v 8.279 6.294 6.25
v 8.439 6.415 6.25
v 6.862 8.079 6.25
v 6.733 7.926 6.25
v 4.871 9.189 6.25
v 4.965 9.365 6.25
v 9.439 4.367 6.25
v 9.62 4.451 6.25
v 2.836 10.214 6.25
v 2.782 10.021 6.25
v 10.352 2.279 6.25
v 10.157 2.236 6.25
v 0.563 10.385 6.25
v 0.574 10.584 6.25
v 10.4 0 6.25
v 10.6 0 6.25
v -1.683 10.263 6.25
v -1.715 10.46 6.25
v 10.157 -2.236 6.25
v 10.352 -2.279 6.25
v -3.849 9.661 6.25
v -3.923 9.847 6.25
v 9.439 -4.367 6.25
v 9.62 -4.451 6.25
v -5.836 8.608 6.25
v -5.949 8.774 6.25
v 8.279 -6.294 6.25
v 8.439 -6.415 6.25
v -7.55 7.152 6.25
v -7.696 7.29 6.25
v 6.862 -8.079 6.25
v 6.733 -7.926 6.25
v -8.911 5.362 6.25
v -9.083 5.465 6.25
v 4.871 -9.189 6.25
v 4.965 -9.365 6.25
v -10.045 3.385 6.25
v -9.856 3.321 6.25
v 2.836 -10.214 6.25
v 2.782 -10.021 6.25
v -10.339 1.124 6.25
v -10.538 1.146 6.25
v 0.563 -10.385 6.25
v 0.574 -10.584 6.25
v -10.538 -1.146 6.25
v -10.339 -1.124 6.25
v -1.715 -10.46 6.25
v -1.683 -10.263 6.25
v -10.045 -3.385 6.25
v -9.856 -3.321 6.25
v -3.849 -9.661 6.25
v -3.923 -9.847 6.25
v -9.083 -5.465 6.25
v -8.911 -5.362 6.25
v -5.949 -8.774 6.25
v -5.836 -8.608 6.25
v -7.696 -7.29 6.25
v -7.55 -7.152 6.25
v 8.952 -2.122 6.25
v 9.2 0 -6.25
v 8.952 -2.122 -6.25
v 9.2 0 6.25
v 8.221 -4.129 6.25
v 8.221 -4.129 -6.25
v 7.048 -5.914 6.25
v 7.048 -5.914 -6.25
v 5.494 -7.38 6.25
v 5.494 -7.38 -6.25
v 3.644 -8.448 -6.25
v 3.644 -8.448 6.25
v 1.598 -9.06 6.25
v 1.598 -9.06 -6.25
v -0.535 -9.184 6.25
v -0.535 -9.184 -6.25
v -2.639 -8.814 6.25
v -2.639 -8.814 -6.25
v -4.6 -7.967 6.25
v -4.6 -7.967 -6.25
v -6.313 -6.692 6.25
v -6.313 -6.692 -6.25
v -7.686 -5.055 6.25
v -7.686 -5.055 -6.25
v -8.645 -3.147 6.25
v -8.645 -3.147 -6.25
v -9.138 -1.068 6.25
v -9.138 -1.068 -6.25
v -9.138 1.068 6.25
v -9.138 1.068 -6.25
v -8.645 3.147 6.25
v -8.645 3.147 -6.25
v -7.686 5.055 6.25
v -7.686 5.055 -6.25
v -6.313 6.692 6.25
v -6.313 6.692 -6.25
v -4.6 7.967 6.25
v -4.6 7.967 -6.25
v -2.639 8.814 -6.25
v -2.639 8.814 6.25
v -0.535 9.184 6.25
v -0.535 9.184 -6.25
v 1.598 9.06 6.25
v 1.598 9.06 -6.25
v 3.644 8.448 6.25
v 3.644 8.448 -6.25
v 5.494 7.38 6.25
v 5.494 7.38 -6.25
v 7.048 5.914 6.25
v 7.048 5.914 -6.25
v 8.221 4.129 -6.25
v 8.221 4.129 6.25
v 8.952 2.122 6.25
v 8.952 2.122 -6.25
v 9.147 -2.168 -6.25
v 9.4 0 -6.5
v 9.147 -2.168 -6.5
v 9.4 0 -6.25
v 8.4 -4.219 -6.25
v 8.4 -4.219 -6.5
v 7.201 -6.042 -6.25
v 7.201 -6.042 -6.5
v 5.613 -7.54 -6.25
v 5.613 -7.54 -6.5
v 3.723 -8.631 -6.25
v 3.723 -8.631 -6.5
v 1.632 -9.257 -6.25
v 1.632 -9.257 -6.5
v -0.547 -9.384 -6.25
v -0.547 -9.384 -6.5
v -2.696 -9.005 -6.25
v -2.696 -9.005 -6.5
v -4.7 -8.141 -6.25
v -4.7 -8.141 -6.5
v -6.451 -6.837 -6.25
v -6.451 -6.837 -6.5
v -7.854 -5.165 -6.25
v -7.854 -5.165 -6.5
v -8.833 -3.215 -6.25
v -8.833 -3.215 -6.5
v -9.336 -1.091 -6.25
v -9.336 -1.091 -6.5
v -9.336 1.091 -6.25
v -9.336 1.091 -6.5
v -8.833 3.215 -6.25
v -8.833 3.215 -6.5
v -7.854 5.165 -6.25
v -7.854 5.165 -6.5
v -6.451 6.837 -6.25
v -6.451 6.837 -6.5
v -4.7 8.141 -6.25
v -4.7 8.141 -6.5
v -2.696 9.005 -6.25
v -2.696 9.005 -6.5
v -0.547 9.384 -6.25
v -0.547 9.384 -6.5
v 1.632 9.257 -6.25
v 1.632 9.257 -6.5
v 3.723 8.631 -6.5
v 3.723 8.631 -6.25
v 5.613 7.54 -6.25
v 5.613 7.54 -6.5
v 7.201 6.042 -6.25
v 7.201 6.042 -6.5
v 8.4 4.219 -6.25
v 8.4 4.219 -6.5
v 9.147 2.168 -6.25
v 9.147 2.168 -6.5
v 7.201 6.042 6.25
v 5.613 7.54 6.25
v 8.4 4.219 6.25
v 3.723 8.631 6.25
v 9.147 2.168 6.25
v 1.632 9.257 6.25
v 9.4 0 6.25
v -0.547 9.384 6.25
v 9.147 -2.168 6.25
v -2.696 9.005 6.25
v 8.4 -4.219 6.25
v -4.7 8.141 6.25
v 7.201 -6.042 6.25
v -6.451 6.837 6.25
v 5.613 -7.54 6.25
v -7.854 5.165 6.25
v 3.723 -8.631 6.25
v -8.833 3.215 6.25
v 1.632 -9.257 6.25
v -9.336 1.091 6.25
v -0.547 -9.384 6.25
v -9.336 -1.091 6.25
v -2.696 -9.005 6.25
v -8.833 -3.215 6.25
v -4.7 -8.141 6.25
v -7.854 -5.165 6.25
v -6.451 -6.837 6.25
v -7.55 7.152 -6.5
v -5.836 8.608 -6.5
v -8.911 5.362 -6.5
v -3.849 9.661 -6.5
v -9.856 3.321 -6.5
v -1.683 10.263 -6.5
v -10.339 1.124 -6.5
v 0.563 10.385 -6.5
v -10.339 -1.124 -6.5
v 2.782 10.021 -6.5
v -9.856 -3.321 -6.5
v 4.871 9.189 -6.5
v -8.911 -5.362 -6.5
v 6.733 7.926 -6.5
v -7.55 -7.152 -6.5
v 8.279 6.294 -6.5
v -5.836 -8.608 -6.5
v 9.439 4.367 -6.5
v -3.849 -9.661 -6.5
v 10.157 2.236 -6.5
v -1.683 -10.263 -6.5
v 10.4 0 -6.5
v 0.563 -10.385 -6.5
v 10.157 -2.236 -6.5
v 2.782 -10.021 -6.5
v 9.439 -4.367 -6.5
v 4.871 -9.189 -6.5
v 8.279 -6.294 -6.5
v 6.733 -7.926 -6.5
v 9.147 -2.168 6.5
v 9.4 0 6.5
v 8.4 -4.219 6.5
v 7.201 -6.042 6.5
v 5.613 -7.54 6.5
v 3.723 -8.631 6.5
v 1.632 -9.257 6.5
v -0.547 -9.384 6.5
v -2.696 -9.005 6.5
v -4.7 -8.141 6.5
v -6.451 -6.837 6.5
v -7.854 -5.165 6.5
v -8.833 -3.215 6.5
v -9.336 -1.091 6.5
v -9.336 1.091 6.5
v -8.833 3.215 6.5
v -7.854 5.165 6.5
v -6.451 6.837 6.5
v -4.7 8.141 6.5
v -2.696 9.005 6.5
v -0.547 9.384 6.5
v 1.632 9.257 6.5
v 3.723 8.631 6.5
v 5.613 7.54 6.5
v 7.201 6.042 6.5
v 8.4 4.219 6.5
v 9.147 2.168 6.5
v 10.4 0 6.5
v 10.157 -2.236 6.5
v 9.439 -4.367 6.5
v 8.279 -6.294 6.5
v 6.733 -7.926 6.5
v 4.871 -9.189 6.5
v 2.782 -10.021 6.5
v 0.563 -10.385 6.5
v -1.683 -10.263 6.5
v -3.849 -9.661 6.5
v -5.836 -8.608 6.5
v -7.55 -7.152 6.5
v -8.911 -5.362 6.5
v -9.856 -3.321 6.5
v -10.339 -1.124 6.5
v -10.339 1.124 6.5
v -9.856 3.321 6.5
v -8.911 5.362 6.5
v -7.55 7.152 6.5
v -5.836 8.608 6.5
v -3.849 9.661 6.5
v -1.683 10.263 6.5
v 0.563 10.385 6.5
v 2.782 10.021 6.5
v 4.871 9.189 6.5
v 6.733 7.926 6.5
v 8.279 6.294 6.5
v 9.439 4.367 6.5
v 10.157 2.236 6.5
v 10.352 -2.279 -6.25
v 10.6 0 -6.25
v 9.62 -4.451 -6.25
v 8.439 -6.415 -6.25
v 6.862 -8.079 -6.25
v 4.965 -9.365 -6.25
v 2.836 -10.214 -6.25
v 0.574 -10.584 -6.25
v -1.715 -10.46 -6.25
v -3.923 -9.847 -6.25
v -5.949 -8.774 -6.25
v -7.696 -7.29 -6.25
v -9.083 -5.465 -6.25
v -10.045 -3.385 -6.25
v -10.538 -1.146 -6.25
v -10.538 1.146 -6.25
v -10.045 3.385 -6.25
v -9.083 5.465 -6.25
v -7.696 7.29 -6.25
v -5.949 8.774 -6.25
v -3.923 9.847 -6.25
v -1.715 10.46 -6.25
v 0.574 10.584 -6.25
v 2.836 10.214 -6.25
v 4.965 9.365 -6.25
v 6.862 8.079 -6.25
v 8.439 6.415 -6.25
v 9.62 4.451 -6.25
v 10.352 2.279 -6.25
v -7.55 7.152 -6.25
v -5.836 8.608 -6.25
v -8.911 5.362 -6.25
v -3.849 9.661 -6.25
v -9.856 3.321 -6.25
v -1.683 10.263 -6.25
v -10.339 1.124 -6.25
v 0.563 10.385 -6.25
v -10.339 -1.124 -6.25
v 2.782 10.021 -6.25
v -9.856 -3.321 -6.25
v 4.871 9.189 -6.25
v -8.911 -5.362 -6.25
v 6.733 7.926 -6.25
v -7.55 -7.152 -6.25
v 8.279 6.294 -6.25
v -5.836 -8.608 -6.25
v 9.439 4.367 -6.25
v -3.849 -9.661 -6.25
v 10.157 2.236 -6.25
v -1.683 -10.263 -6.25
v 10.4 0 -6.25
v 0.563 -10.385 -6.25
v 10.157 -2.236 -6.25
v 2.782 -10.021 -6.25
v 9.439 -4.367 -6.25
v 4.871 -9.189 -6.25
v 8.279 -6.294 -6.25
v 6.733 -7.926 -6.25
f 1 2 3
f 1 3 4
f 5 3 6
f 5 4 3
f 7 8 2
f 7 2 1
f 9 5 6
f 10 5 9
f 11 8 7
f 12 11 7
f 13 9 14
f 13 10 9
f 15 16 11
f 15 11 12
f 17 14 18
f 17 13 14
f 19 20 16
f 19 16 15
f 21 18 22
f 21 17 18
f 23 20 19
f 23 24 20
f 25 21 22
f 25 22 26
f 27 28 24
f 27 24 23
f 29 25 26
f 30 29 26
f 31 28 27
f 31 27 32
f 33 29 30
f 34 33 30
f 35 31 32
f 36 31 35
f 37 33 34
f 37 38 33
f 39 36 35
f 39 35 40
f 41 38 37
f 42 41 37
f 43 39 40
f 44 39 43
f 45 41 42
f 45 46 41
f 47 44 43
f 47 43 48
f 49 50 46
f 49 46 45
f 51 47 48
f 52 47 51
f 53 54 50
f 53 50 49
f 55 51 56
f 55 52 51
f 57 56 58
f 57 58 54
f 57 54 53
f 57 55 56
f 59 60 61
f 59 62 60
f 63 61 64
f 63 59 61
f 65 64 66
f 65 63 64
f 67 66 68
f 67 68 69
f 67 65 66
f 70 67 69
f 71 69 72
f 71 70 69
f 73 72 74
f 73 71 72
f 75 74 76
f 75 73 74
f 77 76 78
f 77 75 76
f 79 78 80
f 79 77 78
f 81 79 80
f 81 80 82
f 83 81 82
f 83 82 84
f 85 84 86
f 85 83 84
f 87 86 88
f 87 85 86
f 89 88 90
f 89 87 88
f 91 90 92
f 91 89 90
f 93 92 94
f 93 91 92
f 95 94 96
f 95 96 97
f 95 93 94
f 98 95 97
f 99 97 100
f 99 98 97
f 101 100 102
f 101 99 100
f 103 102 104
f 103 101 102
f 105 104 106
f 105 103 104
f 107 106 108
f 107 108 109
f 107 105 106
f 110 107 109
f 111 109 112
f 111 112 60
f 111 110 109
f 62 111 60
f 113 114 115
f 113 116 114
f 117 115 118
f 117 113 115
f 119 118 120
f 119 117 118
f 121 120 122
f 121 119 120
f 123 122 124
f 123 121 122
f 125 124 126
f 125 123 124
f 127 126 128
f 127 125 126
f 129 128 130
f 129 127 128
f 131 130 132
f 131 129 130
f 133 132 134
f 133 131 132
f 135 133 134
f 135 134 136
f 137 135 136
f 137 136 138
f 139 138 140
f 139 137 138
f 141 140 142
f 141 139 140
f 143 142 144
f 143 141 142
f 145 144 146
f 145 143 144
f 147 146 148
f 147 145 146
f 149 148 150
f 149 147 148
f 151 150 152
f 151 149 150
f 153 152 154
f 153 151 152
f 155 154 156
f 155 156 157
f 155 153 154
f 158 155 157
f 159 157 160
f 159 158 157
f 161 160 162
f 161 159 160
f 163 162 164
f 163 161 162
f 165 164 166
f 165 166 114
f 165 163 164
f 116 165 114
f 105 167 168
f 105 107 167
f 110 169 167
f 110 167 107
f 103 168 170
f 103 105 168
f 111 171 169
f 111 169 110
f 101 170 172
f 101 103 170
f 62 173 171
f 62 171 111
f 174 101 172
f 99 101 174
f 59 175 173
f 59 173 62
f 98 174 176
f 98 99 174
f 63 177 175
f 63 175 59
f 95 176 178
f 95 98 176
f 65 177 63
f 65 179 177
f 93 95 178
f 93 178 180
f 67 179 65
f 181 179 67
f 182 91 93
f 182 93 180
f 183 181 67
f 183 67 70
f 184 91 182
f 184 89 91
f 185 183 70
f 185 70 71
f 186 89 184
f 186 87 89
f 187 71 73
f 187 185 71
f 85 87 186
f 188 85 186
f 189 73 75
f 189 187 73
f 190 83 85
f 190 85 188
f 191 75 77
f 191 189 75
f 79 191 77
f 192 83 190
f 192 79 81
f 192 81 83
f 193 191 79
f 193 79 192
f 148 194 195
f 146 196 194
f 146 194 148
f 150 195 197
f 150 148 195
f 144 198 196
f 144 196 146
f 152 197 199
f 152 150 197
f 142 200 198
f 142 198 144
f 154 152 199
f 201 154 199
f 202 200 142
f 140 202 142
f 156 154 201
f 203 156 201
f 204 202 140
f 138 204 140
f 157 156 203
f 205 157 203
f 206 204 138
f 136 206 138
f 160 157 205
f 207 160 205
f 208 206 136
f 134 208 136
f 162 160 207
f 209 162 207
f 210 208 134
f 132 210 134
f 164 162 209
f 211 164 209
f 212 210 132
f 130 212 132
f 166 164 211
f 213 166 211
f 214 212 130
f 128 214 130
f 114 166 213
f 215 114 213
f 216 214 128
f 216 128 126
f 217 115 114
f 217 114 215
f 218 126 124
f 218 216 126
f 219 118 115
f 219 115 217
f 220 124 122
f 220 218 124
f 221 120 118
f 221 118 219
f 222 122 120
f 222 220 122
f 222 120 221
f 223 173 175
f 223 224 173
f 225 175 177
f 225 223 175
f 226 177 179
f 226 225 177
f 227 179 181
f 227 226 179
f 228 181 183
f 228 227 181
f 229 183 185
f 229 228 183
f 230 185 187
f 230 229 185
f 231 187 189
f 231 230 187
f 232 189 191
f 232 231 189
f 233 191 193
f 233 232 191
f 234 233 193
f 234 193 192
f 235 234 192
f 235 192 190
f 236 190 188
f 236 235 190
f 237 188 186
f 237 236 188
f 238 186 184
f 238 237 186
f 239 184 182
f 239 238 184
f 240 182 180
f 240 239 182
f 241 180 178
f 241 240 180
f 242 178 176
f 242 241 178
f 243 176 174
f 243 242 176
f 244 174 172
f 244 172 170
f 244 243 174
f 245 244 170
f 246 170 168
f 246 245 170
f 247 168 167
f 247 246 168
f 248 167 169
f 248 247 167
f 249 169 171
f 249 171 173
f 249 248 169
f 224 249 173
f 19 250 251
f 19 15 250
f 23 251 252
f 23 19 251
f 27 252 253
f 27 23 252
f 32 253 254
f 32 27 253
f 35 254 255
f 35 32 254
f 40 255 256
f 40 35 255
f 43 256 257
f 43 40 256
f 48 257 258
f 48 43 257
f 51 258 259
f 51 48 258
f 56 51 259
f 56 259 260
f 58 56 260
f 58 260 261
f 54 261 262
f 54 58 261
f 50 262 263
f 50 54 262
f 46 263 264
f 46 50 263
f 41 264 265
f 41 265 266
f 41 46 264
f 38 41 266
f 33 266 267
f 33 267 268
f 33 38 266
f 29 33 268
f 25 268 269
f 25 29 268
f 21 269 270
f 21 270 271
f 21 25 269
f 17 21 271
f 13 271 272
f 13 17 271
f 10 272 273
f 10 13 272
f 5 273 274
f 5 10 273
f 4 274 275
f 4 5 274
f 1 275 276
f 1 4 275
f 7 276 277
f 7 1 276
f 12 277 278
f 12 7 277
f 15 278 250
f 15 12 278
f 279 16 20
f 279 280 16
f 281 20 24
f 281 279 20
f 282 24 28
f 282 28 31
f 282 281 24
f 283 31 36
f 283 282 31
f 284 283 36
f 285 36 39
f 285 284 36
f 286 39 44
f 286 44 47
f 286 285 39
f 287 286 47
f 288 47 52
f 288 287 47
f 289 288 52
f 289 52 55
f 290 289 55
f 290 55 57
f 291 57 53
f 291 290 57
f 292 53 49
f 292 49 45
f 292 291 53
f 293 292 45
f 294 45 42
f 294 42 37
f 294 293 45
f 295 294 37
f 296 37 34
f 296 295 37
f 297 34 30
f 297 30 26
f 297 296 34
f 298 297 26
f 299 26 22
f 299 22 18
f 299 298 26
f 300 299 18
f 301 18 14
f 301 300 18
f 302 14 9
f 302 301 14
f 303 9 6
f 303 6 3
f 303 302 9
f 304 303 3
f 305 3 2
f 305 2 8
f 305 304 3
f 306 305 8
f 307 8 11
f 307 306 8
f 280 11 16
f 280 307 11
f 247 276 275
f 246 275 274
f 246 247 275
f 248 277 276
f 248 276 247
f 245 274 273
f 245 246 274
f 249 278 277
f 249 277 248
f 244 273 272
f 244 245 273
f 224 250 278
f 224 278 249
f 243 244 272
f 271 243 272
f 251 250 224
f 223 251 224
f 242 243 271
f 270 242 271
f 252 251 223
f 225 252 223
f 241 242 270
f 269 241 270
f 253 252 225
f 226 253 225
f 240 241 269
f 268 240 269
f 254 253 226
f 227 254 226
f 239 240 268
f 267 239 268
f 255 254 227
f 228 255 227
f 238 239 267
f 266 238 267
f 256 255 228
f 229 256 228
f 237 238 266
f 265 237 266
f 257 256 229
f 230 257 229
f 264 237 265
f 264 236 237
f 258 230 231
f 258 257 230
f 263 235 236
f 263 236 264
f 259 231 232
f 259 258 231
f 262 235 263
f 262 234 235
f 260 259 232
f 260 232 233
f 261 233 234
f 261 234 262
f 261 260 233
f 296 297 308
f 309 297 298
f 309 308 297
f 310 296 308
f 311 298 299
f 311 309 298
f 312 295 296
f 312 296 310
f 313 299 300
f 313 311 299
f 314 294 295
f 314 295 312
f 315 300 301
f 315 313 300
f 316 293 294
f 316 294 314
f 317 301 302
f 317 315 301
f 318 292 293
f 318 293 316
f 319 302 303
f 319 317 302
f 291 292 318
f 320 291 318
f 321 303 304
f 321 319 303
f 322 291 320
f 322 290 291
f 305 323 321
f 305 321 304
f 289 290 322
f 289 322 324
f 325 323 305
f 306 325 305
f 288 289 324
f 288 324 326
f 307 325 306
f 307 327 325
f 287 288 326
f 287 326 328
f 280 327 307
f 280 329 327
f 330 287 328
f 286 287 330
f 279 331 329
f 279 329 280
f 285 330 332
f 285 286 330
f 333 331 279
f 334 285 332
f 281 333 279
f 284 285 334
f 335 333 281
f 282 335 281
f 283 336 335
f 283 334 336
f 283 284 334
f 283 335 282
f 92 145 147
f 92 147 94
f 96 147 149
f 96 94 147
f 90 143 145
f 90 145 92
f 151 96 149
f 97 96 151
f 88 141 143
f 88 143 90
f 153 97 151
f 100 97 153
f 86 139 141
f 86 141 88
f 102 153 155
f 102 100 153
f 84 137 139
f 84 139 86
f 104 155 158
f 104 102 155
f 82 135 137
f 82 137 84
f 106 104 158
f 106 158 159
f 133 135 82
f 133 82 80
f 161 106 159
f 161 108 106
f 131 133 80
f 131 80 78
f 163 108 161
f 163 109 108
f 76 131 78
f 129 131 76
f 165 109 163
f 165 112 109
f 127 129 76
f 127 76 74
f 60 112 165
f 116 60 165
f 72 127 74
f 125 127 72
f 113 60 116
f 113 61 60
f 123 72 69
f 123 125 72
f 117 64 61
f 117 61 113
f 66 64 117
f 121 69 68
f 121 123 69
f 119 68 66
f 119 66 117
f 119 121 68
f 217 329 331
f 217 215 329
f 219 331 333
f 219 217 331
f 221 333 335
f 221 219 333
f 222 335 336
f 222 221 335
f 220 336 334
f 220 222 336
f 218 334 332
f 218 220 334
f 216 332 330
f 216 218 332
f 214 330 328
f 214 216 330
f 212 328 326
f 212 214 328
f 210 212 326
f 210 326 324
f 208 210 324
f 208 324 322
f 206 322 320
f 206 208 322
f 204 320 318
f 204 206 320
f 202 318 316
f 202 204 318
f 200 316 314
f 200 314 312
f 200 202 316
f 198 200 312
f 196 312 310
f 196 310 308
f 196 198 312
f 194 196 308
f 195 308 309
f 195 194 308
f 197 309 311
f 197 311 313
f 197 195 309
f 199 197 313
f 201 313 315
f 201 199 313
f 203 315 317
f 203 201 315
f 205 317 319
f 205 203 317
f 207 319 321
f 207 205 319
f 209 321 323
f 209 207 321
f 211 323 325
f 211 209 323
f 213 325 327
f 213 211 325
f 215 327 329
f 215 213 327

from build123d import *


with BuildPart() as part:
    # Esquisse2 → Révolution1 (revolve)
    with BuildSketch(Plane(origin=(0, 0, 0), x_dir=(0, 0, -1), z_dir=(1, 0, 0)), mode=Mode.PRIVATE) as r_volution1_sk:
        Polygon((-6.5, 10.4), (-6.25, 10.4), (-6.25, 10.6), (6.25, 10.6), (6.25, 10.4), (6.5, 10.4), (6.5, 9.4), (6.25, 9.4), (6.25, 9.2), (-6.25, 9.2), (-6.25, 9.4), (-6.5, 9.4), align=None)
    revolve(r_volution1_sk.sketch.rotate(Axis((0, 0, 6.88356419), (0, 0, -1)), 90), axis=Axis((0, 0, 6.88356419), (0, 0, -1)))


solid = part.part
